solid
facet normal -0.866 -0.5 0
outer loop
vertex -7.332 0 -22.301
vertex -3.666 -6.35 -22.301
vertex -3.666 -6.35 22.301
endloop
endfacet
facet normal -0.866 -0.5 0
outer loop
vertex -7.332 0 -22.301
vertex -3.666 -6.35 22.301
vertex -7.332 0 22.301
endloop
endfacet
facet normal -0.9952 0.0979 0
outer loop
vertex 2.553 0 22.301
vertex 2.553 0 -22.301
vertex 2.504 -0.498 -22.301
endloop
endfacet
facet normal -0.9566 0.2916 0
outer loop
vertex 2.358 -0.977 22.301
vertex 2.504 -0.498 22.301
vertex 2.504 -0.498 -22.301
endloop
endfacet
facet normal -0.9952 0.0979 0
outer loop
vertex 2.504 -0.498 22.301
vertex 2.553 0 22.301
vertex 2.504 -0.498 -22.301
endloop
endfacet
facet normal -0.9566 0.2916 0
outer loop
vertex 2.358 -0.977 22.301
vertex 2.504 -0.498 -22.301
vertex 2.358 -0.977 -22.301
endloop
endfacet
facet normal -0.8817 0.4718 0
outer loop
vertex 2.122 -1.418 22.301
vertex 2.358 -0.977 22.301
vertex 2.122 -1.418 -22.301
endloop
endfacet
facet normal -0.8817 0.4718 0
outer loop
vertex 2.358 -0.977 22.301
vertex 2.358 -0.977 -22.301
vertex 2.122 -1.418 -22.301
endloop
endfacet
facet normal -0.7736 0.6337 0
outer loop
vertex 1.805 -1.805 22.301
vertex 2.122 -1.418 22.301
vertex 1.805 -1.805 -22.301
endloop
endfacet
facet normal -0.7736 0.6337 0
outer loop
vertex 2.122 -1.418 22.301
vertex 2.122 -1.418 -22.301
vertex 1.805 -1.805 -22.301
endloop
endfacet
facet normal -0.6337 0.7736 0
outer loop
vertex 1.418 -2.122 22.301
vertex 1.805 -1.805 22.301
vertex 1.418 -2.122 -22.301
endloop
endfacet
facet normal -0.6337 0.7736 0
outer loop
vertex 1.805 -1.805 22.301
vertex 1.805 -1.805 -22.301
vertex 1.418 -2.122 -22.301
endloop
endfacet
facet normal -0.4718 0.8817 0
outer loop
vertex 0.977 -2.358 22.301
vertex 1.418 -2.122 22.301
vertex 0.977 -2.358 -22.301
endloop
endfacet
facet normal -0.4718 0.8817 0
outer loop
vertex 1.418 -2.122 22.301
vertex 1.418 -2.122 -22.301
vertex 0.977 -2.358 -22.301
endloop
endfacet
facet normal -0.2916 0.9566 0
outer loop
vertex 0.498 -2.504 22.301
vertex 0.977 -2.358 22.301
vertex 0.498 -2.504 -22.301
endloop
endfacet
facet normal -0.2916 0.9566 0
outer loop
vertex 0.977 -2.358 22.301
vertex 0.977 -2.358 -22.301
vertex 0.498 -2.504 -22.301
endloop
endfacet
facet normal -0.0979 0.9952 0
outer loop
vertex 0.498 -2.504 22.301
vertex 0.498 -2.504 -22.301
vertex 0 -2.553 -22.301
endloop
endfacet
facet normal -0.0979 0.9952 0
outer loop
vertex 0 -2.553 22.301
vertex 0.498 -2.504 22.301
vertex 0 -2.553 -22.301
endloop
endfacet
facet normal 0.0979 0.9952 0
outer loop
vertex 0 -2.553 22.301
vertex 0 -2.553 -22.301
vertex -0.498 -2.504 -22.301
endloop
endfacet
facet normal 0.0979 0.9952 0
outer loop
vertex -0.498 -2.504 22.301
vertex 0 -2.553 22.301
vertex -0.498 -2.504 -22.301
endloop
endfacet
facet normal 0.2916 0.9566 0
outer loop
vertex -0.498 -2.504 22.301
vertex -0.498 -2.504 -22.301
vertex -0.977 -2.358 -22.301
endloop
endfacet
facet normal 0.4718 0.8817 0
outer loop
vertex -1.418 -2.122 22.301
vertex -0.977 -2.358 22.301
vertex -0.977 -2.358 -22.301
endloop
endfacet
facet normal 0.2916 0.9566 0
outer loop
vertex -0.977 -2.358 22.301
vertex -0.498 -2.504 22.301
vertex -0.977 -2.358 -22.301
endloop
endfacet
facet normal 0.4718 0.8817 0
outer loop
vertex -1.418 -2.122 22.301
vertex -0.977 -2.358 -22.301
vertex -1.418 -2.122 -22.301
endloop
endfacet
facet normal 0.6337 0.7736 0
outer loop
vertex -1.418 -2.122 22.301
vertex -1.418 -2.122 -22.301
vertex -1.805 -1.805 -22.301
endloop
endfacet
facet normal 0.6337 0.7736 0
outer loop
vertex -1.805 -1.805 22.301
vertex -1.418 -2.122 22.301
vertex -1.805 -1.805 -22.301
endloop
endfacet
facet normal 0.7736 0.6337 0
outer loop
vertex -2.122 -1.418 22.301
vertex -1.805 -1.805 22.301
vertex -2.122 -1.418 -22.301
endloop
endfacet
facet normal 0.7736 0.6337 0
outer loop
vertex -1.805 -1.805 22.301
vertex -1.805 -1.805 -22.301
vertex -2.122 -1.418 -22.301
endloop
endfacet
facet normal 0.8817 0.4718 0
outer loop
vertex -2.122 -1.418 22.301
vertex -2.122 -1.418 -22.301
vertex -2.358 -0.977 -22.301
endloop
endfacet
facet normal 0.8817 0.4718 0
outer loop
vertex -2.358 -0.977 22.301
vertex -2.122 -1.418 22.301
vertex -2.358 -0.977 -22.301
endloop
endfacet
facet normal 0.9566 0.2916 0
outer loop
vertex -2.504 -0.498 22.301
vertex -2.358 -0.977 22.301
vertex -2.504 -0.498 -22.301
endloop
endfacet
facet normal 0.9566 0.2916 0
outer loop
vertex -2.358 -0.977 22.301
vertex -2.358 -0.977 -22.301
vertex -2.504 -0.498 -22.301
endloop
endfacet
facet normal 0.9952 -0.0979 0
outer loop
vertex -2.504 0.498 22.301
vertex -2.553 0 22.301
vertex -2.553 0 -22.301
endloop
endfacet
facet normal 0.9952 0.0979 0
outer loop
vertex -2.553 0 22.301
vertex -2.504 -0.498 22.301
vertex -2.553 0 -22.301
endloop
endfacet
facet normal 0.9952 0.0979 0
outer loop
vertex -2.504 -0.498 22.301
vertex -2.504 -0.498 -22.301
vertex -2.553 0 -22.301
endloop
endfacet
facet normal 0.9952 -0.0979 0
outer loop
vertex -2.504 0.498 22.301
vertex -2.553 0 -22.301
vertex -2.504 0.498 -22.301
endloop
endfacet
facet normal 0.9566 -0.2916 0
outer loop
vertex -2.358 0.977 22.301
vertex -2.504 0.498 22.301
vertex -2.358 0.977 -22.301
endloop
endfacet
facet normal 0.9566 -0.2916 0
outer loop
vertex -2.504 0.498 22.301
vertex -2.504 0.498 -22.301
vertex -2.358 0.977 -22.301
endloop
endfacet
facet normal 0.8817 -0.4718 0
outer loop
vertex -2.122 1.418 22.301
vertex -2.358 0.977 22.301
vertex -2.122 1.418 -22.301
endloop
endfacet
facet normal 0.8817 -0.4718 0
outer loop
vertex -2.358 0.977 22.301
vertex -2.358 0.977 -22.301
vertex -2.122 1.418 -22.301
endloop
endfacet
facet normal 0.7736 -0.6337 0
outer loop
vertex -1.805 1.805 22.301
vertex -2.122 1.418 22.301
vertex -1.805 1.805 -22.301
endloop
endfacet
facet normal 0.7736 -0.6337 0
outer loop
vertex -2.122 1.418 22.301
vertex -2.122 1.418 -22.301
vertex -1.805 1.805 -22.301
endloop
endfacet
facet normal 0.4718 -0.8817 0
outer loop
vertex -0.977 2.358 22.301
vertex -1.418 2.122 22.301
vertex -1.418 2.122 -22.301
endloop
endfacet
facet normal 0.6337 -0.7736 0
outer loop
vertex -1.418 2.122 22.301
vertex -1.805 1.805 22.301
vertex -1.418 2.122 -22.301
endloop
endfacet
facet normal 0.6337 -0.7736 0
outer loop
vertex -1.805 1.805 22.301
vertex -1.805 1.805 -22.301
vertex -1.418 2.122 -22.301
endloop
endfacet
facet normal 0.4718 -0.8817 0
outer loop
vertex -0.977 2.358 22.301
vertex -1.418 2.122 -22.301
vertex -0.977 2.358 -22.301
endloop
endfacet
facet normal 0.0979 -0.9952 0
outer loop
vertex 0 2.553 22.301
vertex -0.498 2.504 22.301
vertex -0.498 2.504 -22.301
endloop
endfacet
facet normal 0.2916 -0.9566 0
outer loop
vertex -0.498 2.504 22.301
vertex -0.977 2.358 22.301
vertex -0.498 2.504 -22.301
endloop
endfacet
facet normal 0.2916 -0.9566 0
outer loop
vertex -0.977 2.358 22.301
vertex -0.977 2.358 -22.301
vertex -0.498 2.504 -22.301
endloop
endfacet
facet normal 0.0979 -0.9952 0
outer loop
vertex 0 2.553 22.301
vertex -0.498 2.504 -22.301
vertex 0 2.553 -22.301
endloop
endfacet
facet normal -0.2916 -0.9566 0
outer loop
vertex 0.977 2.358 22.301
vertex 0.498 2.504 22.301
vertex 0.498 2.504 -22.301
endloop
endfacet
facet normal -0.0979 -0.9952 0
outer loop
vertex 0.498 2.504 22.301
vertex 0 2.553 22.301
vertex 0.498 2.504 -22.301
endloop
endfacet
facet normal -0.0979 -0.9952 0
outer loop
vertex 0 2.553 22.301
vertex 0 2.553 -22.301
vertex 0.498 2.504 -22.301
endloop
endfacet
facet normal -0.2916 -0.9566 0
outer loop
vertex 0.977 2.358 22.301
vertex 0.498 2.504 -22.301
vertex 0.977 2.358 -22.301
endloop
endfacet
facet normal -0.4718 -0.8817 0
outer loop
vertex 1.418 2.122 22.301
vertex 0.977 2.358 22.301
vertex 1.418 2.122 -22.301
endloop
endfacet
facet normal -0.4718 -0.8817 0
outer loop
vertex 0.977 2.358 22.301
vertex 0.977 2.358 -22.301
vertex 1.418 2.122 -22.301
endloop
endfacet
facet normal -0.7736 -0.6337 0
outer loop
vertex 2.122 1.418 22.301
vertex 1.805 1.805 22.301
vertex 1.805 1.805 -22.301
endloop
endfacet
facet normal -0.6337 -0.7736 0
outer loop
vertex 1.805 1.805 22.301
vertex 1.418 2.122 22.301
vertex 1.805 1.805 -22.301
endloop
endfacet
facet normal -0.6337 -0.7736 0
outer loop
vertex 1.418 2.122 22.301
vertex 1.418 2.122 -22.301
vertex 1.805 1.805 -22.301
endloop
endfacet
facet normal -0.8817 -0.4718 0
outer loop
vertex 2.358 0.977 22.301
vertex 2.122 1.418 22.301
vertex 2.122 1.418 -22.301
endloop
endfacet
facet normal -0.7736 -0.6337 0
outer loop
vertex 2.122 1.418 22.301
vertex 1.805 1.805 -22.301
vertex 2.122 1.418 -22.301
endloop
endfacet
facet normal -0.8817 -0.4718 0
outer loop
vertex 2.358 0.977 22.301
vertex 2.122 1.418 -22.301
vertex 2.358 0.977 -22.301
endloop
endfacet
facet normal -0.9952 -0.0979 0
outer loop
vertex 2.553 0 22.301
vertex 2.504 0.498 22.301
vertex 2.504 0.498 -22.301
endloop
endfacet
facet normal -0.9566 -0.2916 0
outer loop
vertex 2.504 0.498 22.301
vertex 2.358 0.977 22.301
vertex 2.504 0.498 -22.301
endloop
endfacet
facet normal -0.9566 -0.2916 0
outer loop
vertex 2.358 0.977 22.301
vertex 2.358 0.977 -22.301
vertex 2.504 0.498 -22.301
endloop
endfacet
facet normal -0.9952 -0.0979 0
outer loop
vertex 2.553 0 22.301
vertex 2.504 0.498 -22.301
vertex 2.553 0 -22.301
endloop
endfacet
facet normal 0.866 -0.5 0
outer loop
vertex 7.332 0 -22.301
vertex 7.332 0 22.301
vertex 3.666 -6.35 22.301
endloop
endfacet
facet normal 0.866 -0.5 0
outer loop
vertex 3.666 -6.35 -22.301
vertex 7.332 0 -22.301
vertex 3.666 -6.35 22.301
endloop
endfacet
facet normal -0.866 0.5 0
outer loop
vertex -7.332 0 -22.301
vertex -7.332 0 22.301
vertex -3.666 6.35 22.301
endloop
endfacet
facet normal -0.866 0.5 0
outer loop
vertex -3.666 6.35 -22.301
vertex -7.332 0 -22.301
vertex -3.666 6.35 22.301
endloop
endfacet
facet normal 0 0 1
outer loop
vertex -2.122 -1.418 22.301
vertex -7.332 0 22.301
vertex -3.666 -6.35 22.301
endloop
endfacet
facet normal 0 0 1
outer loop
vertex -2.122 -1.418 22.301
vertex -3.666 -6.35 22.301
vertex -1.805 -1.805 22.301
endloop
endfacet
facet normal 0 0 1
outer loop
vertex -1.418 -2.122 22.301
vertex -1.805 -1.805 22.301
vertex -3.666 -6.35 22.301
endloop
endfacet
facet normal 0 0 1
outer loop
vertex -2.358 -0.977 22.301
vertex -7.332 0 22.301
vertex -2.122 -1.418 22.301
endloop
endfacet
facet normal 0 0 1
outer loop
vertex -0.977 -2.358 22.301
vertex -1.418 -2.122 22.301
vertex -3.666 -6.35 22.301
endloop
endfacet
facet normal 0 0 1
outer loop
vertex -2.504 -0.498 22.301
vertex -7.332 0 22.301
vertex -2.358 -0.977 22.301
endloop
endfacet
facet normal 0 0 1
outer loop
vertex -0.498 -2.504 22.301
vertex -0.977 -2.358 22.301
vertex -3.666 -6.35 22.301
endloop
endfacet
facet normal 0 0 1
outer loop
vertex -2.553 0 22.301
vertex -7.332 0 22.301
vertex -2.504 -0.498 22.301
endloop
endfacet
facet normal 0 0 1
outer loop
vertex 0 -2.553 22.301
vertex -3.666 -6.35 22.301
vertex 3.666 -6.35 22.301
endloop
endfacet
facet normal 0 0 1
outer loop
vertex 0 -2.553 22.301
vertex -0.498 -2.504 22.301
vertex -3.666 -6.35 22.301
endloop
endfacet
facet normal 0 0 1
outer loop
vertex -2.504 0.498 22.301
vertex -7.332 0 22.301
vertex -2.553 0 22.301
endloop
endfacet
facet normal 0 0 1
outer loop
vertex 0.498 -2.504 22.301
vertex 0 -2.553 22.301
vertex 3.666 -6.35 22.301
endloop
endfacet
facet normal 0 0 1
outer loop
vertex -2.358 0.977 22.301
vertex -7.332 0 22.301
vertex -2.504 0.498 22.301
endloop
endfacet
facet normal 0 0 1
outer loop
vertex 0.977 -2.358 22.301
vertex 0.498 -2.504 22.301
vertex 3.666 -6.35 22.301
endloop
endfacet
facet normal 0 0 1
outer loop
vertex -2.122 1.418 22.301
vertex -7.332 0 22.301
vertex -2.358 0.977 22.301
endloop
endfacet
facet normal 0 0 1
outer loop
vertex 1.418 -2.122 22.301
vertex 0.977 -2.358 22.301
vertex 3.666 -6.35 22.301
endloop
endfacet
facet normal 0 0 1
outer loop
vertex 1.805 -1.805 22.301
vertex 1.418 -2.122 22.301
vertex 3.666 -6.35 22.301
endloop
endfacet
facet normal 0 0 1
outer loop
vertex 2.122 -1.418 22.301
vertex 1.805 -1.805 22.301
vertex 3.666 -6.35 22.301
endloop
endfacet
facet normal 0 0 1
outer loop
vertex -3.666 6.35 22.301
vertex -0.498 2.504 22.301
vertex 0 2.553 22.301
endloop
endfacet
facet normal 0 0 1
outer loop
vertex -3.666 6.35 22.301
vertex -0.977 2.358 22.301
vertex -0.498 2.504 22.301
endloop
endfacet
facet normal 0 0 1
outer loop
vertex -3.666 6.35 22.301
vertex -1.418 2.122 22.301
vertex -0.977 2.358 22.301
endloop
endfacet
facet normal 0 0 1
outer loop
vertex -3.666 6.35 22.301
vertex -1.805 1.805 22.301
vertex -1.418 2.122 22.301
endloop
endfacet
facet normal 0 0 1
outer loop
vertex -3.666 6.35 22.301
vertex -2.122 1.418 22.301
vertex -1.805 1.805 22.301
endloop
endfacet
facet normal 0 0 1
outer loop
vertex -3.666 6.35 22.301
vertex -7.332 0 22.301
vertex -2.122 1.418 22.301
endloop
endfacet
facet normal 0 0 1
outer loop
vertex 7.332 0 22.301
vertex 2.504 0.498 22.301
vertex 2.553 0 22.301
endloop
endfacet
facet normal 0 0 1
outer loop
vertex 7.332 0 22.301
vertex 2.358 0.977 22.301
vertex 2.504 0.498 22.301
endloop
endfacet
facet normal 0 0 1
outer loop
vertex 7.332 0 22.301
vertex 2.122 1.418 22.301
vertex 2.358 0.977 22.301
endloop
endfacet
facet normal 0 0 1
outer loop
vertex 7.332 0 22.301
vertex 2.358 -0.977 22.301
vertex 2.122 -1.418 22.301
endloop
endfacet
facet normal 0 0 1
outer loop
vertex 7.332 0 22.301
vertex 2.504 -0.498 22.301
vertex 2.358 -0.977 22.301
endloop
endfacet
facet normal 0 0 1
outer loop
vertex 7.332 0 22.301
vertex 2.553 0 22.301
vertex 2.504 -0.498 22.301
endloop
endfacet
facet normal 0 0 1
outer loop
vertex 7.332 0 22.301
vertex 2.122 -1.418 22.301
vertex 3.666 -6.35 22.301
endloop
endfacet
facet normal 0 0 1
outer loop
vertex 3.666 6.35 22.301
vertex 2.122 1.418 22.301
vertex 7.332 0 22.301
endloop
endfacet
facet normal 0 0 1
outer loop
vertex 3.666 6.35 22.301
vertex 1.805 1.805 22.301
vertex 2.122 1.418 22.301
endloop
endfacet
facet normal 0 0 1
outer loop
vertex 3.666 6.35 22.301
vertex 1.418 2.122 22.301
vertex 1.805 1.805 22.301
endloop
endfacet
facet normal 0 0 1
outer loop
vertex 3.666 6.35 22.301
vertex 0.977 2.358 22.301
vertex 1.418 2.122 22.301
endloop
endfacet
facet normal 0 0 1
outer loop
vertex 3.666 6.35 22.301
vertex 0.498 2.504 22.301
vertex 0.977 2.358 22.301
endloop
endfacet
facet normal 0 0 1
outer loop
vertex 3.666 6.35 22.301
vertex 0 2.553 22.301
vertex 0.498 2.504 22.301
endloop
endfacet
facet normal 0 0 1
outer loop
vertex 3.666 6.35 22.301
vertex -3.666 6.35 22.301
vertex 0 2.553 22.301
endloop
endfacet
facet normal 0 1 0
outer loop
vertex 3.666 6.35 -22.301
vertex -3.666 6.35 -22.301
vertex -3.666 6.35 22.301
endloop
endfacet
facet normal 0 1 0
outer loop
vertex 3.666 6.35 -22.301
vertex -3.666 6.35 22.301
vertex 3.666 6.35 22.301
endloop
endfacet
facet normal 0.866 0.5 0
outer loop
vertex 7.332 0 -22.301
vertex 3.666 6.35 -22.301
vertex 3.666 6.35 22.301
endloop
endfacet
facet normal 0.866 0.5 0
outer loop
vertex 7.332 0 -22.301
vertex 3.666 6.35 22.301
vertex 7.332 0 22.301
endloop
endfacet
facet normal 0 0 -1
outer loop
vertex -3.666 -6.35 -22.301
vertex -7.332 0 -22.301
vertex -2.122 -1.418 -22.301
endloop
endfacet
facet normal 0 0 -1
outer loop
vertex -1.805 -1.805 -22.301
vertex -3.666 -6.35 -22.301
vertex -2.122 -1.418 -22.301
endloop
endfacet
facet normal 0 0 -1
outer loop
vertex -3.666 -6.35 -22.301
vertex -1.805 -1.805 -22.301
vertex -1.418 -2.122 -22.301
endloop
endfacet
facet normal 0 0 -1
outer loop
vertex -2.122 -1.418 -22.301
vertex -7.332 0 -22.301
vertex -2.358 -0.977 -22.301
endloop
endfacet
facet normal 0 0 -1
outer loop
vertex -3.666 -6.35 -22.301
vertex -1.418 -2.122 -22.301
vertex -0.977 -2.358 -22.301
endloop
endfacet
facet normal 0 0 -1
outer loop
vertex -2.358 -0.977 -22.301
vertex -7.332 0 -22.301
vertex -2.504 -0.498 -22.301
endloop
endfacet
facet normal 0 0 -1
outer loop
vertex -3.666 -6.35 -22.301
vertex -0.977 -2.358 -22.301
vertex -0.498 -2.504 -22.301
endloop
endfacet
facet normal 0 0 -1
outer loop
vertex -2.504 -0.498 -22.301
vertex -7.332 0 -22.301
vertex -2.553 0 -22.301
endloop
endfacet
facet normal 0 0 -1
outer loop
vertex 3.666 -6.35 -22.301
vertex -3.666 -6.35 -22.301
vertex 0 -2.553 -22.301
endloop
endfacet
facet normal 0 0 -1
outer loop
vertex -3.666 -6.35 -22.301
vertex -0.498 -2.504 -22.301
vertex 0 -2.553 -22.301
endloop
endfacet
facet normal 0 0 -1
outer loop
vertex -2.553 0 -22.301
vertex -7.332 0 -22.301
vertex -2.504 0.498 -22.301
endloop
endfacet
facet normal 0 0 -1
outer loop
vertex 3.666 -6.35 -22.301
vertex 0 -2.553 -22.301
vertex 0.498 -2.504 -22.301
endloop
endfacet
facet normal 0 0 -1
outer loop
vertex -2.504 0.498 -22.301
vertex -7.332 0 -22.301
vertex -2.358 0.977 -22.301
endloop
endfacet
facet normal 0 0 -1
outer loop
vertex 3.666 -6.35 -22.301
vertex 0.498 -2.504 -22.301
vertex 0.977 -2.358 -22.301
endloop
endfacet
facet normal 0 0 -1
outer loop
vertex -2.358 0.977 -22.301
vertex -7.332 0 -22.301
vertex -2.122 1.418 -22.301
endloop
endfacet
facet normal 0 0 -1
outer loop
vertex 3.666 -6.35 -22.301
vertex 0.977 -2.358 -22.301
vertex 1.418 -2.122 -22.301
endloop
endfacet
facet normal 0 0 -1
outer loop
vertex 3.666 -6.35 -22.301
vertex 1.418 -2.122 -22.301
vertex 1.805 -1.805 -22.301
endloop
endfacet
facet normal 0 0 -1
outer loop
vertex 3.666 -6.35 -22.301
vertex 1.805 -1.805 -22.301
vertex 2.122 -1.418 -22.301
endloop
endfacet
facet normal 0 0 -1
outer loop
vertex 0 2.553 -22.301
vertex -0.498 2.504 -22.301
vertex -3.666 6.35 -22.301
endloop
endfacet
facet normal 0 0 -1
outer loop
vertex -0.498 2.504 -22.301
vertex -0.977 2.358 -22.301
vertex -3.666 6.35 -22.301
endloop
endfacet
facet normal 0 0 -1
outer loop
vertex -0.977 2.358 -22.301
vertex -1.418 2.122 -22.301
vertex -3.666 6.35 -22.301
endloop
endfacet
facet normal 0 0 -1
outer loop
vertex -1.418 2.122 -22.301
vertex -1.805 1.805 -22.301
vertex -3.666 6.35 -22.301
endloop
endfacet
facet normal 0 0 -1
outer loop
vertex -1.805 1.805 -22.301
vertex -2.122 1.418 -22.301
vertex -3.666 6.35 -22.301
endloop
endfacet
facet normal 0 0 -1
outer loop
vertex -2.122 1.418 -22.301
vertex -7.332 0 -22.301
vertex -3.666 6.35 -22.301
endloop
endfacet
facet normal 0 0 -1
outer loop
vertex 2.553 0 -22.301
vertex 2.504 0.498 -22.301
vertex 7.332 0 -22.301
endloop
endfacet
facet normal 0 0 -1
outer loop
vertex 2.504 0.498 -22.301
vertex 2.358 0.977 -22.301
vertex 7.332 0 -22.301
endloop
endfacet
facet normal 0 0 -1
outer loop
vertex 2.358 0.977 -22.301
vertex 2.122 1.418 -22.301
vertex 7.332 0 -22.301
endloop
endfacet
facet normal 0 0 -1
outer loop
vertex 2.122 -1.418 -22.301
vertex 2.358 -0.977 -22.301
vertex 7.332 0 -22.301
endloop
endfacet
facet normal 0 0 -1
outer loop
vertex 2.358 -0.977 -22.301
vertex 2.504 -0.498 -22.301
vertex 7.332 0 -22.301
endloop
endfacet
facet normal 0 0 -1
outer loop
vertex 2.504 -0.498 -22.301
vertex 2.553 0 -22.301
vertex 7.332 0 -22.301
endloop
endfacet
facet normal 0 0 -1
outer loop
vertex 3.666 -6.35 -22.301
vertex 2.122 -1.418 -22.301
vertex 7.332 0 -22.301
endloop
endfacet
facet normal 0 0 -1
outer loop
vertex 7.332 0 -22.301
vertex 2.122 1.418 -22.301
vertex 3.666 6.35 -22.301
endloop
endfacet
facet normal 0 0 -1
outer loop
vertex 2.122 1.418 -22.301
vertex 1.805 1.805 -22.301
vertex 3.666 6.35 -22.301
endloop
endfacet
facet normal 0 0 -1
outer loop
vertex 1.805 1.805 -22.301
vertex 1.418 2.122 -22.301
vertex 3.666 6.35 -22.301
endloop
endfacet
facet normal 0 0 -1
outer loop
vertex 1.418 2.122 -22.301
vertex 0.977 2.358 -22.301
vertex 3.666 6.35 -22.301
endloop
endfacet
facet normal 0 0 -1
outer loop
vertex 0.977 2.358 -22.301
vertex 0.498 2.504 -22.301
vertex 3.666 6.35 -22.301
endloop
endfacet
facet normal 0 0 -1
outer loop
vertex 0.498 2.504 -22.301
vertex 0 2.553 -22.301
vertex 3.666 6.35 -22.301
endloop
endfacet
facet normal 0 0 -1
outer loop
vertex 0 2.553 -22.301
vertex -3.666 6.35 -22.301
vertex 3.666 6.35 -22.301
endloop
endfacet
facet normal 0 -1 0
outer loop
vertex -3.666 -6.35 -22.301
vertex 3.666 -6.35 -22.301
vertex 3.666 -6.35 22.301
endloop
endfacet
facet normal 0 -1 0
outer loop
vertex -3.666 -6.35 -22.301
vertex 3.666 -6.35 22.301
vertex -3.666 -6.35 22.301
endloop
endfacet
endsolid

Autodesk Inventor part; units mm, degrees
ref_plane "YZ Plane" through (0, 0, 0) normal (1, 0, 0) x (0, 1, 0)
ref_plane "XZ Plane" through (0, 0, 0) normal (0, 1, 0) x (-1, 0, 0)
ref_plane "XY Plane" through (0, 0, 0) normal (0, 0, 1) x (1, 0, 0)
sketch "Sketch1" plane through (0, 0, 0) normal (0, 0, 1) x (1, 0, 0)
  circle A0 centre (0, 0) radius 2.5527
  line L0 (7.3323, 0) -> (3.6662, -6.35)
  line L1 (3.6662, -6.35) -> (-3.6662, -6.35)
  line L2 (-3.6662, -6.35) -> (-7.3323, 0)
  line L3 (-7.3323, 0) -> (-3.6662, 6.35)
  line L4 (-3.6662, 6.35) -> (3.6662, 6.35)
  line L5 (3.6662, 6.35) -> (7.3323, 0)
  point P0 (0, 6.35)
  dimension "d0" = 5.1054
  dimension "d1" = 12.7
extrude "Extrusion1" add sketch "Sketch1" along normal mid plane 44.6024
thread "Thread1" size "1/4-20 UNC" class "2B" standard "ANSI Unified Screw Threads" full length
properties part number "Hex shaft 0.201 and 0.500"
